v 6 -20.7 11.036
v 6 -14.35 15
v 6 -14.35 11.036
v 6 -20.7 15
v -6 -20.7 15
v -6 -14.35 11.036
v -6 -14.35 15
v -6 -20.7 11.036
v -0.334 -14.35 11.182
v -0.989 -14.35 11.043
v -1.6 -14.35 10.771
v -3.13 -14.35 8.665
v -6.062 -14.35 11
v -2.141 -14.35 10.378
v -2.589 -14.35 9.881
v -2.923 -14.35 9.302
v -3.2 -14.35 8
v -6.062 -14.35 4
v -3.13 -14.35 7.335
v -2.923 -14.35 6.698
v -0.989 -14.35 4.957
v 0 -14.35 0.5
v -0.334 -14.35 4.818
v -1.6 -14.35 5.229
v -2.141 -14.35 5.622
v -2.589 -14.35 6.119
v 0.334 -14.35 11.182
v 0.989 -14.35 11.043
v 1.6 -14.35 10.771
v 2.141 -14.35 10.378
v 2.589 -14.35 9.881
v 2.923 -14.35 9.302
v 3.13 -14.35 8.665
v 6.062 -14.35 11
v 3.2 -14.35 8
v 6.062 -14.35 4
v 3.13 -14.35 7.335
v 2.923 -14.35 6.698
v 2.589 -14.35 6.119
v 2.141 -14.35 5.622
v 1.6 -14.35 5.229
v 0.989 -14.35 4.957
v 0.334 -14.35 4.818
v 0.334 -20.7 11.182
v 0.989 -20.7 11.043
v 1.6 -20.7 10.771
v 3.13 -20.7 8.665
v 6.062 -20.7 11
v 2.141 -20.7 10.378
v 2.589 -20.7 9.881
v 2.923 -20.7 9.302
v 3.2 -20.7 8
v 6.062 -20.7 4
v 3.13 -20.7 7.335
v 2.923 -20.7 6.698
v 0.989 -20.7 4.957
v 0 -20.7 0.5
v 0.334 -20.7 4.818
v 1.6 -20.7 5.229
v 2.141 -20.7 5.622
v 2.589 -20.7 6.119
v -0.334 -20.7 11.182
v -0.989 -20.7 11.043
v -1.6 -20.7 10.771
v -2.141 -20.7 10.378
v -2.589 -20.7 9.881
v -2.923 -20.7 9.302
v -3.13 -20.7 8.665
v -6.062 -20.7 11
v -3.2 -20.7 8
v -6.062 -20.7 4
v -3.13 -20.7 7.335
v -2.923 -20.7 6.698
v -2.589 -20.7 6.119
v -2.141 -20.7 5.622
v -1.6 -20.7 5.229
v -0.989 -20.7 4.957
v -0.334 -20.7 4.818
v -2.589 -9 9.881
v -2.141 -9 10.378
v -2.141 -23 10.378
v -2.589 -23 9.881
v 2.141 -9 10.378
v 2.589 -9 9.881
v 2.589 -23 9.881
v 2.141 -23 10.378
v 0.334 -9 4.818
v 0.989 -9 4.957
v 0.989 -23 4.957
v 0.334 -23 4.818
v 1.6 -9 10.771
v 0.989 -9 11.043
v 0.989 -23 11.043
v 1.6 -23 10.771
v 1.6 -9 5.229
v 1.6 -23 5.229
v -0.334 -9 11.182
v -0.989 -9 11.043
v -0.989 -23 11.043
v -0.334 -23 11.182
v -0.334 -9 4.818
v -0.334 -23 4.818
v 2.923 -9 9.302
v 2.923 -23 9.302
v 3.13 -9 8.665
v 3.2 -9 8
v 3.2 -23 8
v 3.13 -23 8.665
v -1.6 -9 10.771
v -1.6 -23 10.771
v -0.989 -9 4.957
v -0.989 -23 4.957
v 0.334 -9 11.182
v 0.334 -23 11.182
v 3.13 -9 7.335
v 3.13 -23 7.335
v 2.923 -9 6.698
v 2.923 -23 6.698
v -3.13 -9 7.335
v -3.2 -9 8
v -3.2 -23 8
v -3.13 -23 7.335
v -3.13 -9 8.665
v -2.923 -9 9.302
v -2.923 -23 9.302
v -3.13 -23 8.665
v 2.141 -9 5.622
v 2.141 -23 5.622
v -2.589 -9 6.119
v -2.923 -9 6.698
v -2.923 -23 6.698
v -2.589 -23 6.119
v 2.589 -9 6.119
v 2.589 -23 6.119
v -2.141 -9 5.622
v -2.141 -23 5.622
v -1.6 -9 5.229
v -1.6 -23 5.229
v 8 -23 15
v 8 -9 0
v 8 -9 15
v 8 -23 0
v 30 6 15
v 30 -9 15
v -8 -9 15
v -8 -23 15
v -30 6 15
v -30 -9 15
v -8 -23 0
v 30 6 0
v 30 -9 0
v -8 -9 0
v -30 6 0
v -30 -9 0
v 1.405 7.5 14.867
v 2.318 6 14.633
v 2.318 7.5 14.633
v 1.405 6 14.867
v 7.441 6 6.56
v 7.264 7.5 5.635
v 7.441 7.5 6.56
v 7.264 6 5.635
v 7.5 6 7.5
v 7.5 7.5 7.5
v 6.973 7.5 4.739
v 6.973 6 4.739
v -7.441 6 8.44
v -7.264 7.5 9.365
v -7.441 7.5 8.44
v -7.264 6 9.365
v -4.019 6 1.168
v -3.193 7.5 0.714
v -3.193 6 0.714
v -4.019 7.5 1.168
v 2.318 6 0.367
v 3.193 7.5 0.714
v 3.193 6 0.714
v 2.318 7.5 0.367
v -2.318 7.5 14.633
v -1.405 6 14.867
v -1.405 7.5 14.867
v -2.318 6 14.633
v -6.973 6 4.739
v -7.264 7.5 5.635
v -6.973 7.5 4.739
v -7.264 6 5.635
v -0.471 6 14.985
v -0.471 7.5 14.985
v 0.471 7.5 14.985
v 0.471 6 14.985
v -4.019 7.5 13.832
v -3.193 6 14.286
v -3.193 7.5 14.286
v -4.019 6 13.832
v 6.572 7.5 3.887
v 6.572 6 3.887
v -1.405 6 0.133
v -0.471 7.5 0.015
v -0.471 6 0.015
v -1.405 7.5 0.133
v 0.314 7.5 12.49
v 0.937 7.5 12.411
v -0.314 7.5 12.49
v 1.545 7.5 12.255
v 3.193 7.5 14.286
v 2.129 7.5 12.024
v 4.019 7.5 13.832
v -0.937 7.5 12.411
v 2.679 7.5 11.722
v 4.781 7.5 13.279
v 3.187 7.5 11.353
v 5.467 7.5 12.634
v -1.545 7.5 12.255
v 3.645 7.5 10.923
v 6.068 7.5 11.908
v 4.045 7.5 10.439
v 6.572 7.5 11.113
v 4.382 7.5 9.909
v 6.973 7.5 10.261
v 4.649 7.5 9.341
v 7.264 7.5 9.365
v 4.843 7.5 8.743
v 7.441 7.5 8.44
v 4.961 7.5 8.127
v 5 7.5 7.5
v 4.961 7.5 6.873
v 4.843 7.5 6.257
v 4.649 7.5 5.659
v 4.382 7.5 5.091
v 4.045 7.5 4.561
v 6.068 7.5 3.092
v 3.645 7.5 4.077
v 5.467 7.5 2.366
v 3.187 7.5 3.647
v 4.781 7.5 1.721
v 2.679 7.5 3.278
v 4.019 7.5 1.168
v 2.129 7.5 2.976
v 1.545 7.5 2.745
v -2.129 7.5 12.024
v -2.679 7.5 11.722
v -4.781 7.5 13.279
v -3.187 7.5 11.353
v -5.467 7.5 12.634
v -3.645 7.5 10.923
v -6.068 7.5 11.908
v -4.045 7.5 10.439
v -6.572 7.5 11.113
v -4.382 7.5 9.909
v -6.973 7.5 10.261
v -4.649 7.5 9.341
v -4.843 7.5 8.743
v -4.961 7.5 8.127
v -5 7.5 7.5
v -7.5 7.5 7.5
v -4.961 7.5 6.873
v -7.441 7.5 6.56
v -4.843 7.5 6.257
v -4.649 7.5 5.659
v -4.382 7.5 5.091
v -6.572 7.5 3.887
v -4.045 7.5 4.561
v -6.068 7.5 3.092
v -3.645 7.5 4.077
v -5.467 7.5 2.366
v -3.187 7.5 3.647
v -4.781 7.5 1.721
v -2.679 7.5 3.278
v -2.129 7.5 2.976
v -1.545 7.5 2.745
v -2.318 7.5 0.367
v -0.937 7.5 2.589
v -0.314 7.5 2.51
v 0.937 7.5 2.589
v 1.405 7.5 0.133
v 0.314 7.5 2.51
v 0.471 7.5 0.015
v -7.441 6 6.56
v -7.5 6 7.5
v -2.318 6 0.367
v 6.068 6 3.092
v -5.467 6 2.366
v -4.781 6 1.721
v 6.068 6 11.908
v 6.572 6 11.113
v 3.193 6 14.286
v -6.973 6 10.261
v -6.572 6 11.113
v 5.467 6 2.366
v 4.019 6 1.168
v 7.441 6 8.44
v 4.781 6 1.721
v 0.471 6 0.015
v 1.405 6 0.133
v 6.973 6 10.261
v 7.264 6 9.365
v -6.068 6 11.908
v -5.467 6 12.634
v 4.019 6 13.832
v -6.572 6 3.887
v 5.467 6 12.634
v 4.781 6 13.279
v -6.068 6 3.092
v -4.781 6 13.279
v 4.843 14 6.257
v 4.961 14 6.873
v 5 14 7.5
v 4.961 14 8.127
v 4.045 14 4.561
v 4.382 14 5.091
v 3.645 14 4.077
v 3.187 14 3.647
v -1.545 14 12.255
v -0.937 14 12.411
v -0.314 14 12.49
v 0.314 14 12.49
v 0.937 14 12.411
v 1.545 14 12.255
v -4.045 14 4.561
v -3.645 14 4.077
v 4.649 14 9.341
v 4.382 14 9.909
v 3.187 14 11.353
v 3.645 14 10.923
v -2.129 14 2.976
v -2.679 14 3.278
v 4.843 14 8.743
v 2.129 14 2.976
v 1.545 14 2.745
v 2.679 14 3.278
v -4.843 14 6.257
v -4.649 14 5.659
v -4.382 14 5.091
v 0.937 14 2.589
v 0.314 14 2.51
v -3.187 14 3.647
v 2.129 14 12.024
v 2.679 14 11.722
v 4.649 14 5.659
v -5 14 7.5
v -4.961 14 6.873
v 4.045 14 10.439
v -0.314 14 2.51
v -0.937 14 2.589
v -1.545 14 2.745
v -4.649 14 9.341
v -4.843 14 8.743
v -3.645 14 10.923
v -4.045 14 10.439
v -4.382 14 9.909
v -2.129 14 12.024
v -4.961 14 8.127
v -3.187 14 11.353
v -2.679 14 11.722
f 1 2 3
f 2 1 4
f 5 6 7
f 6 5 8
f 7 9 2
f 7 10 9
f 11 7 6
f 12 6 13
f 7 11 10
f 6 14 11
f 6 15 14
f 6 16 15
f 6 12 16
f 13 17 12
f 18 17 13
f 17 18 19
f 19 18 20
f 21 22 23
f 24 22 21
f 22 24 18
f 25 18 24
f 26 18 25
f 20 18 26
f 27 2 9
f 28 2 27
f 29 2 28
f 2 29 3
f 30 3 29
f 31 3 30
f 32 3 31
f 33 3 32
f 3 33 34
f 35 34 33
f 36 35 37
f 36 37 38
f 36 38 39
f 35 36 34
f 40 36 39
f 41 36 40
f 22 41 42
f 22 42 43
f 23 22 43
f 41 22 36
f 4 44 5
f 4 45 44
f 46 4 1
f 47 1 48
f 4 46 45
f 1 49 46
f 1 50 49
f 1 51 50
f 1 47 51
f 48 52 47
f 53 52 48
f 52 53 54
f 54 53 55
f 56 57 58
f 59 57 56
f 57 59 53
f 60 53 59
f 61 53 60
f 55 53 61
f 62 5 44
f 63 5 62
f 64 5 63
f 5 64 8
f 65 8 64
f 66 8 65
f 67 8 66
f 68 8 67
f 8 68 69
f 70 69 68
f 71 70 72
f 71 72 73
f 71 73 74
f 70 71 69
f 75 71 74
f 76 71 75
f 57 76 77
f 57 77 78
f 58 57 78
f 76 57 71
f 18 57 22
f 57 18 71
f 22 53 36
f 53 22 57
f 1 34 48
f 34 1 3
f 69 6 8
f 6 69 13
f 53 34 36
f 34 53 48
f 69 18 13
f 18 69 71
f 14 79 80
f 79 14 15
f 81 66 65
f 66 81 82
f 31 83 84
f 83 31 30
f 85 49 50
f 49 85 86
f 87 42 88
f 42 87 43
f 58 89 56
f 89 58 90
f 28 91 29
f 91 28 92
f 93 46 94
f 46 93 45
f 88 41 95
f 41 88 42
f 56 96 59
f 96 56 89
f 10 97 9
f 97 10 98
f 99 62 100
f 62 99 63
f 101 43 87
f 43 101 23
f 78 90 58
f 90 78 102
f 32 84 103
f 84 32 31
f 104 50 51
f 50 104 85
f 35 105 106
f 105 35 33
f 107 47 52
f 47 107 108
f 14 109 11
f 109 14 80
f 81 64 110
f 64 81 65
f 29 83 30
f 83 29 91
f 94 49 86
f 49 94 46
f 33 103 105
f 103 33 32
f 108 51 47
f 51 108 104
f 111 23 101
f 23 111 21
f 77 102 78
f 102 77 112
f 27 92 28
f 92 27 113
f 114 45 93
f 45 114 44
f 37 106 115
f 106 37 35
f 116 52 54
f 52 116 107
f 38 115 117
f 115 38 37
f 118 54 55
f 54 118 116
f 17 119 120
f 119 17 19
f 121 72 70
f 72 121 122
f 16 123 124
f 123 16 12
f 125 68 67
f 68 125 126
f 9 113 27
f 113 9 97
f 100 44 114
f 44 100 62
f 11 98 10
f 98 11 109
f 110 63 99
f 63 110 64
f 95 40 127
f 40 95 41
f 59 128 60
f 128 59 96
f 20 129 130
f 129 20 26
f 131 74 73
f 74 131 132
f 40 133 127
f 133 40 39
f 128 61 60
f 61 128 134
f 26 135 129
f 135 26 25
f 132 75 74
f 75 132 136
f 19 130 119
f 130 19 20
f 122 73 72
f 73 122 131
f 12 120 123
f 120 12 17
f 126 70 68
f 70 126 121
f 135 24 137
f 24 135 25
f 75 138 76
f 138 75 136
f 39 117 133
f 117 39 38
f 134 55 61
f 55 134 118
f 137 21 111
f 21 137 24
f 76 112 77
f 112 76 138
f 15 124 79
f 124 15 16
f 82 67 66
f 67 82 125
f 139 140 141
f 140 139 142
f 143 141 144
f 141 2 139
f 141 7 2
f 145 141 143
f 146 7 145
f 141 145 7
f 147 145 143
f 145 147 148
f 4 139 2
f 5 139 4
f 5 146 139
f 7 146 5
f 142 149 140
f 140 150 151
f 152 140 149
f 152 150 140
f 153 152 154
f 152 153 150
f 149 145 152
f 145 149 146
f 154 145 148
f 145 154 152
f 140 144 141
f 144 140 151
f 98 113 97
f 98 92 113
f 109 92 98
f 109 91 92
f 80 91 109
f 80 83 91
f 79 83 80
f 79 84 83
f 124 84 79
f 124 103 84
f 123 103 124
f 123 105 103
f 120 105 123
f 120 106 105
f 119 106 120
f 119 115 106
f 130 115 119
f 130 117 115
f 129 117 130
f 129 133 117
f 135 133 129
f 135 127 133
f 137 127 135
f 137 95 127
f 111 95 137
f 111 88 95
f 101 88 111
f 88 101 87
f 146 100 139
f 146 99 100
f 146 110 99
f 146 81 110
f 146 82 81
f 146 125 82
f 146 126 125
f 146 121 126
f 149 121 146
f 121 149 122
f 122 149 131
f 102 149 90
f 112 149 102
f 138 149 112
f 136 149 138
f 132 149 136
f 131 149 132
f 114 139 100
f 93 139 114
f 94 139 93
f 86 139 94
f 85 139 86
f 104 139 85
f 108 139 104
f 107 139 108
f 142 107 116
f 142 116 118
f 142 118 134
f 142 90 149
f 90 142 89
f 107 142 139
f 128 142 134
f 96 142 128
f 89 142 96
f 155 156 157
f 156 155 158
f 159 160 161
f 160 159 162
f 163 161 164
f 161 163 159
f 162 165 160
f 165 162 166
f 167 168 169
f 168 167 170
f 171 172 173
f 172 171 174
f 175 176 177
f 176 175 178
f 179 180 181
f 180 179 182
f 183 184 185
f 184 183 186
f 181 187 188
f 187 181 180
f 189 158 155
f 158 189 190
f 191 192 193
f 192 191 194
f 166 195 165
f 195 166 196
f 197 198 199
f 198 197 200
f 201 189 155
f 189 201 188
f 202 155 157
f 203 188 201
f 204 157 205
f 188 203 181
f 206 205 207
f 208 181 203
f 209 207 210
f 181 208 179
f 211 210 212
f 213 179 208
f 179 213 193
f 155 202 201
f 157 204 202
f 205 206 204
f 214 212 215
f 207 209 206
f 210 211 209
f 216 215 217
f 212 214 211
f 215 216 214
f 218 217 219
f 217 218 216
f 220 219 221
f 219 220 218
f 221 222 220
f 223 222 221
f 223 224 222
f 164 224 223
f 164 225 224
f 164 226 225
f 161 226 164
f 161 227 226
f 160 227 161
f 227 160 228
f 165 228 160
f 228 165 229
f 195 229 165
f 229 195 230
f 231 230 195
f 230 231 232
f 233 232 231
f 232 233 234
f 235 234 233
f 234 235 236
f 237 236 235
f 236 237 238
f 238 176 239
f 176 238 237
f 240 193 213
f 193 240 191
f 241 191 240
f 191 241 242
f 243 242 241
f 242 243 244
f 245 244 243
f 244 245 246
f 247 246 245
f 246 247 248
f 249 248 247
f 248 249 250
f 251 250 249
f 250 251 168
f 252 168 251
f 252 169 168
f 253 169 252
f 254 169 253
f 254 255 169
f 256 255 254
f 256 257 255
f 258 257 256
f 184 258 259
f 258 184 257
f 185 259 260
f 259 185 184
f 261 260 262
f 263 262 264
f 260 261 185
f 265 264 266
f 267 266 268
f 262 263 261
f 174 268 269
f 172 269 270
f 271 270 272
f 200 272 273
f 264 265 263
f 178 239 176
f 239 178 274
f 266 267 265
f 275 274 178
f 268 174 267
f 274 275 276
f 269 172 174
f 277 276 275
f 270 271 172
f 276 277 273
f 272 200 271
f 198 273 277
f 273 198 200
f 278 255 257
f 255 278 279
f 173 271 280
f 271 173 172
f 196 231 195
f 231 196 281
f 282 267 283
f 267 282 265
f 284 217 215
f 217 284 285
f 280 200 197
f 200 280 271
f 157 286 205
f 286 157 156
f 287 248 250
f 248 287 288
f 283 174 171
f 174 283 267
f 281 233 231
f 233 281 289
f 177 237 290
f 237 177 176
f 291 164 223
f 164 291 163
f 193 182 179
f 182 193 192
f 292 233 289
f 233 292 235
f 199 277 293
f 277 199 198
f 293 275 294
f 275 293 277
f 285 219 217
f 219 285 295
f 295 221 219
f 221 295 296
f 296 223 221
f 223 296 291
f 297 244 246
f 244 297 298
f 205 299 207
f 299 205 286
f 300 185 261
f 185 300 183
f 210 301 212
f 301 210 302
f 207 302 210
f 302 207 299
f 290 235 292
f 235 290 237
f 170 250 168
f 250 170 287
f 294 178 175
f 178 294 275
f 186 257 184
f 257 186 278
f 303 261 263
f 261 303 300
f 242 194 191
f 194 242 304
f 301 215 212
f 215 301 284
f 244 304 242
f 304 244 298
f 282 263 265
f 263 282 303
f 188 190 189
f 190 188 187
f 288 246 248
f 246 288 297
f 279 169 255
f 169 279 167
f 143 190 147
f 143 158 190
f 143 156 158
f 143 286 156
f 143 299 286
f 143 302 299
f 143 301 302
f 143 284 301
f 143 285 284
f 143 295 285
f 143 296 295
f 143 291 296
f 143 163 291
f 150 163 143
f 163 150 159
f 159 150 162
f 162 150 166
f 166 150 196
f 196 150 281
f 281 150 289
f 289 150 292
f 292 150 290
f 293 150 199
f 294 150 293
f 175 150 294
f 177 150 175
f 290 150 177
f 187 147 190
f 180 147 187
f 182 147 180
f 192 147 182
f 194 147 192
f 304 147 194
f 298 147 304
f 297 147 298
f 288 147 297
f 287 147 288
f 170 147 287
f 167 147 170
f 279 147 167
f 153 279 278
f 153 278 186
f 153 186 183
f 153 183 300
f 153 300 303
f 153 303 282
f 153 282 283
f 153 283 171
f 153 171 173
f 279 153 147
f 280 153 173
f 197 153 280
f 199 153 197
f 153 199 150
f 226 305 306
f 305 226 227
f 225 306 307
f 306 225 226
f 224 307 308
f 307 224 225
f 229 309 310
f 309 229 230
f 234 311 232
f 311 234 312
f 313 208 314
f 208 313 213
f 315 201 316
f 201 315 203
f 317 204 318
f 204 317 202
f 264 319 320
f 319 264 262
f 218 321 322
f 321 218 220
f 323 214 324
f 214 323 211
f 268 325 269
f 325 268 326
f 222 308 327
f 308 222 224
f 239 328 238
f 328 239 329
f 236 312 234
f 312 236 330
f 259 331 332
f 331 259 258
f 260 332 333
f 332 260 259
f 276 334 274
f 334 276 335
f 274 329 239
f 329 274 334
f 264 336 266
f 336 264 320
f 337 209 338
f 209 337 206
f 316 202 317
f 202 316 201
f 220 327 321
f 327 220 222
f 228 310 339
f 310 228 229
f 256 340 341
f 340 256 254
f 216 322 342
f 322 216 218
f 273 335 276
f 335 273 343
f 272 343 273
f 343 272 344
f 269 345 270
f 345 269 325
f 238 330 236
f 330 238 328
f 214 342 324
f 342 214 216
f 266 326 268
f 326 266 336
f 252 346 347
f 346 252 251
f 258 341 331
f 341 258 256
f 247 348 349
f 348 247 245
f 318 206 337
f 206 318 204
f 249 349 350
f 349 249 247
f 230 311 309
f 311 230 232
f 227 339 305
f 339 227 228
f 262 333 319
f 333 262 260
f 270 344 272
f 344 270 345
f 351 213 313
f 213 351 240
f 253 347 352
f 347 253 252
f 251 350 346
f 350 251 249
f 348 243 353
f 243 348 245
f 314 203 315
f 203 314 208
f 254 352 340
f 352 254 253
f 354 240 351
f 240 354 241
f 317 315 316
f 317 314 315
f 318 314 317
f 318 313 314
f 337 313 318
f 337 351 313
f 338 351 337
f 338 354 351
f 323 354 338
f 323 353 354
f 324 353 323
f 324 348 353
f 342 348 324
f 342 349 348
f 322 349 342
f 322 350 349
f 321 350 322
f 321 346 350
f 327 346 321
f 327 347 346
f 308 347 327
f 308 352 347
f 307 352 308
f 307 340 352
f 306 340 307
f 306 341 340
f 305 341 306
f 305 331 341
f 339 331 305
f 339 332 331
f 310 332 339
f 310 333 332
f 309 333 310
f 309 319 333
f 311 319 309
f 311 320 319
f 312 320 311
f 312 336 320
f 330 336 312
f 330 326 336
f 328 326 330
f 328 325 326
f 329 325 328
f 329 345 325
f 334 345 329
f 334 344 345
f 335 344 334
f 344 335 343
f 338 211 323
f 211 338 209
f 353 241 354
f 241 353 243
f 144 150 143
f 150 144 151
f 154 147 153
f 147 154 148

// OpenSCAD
difference(){
    translate([-8,-23,0]) cube([16,14,15]);
    union(){
        translate([-6,-20.7,10]) cube([12,6.35,15]);
        translate([0,-14.35,7.5]) rotate([90,30,0]) cylinder(6.35,7,7,$fn=6);
        translate([0,-8,8]) rotate([90,0,0]) cylinder(20,3.2,3.2,$fn=30);
    }
}
translate([-30,-9,0]) cube([60,15,15]);
translate([0,6,7.5]) rotate([-90,0,0])
union(){
    cylinder(1.5,7.5,7.5,$fn=50);
    cylinder(8,5,5,$fn=50);
}
